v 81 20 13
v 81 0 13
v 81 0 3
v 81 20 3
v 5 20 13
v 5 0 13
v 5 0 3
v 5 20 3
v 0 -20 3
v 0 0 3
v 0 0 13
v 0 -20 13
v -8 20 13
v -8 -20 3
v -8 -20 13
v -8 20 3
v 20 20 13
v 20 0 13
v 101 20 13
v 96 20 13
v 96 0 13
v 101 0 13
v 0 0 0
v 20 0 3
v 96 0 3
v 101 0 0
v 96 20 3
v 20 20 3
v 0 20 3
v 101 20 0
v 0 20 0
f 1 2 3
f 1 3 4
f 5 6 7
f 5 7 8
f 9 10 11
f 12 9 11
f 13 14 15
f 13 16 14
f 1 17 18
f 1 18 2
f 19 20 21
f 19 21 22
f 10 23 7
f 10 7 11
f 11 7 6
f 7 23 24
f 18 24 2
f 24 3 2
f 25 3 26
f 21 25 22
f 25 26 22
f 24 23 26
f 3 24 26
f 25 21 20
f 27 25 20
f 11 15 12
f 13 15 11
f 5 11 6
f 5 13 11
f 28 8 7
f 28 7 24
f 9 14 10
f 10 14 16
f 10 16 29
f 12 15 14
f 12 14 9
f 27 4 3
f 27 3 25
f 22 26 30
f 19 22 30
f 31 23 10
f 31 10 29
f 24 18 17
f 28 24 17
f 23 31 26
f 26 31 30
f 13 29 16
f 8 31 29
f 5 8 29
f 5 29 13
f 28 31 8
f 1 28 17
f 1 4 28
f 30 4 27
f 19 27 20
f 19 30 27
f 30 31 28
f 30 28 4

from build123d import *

# Parameters (mm, degrees)
SKETCH_W     = 101
SKETCH_H     = 20
PAD_DEPTH    = 13
SKETCH001_W  = 15
SKETCH001_H  = 20
POCKET_DEPTH = 10
SKETCH002_W  = 20
SKETCH002_H  = 10
PAD001_DEPTH = 8
SKETCH003_W  = 8
SKETCH003_H  = 10
PAD002_DEPTH = 20


with BuildPart() as part:
    # Sketch → Pad (new body)
    with BuildSketch(Plane.XY):
        with Locations((50.5, 10)):
            Rectangle(SKETCH_W, SKETCH_H)
    extrude(amount=PAD_DEPTH)

    # Sketch001 (on Face6 of Pad) → Pocket (cut)
    with BuildSketch(Plane.XY.offset(13)):
        with Locations((12.5, 10)):
            Rectangle(SKETCH001_W, SKETCH001_H)
        with Locations((88.5, 10)):
            Rectangle(SKETCH001_W, SKETCH001_H)
    extrude(amount=-POCKET_DEPTH, mode=Mode.SUBTRACT)

    # Sketch002 (on Face13 of Pocket) → Pad001 (join)
    with BuildSketch(Plane(origin=(0, 0, 0), x_dir=(0, -1, 0), z_dir=(-1, 0, 0))):
        with Locations((-10, 8)):
            Rectangle(SKETCH002_W, SKETCH002_H)
    extrude(amount=PAD001_DEPTH)

    # Sketch003 (on Face14 of Pad001) → Pad002 (join)
    with BuildSketch(Plane.XZ):
        with Locations((-4, 8)):
            Rectangle(SKETCH003_W, SKETCH003_H)
    extrude(amount=PAD002_DEPTH)


solid = part.part
